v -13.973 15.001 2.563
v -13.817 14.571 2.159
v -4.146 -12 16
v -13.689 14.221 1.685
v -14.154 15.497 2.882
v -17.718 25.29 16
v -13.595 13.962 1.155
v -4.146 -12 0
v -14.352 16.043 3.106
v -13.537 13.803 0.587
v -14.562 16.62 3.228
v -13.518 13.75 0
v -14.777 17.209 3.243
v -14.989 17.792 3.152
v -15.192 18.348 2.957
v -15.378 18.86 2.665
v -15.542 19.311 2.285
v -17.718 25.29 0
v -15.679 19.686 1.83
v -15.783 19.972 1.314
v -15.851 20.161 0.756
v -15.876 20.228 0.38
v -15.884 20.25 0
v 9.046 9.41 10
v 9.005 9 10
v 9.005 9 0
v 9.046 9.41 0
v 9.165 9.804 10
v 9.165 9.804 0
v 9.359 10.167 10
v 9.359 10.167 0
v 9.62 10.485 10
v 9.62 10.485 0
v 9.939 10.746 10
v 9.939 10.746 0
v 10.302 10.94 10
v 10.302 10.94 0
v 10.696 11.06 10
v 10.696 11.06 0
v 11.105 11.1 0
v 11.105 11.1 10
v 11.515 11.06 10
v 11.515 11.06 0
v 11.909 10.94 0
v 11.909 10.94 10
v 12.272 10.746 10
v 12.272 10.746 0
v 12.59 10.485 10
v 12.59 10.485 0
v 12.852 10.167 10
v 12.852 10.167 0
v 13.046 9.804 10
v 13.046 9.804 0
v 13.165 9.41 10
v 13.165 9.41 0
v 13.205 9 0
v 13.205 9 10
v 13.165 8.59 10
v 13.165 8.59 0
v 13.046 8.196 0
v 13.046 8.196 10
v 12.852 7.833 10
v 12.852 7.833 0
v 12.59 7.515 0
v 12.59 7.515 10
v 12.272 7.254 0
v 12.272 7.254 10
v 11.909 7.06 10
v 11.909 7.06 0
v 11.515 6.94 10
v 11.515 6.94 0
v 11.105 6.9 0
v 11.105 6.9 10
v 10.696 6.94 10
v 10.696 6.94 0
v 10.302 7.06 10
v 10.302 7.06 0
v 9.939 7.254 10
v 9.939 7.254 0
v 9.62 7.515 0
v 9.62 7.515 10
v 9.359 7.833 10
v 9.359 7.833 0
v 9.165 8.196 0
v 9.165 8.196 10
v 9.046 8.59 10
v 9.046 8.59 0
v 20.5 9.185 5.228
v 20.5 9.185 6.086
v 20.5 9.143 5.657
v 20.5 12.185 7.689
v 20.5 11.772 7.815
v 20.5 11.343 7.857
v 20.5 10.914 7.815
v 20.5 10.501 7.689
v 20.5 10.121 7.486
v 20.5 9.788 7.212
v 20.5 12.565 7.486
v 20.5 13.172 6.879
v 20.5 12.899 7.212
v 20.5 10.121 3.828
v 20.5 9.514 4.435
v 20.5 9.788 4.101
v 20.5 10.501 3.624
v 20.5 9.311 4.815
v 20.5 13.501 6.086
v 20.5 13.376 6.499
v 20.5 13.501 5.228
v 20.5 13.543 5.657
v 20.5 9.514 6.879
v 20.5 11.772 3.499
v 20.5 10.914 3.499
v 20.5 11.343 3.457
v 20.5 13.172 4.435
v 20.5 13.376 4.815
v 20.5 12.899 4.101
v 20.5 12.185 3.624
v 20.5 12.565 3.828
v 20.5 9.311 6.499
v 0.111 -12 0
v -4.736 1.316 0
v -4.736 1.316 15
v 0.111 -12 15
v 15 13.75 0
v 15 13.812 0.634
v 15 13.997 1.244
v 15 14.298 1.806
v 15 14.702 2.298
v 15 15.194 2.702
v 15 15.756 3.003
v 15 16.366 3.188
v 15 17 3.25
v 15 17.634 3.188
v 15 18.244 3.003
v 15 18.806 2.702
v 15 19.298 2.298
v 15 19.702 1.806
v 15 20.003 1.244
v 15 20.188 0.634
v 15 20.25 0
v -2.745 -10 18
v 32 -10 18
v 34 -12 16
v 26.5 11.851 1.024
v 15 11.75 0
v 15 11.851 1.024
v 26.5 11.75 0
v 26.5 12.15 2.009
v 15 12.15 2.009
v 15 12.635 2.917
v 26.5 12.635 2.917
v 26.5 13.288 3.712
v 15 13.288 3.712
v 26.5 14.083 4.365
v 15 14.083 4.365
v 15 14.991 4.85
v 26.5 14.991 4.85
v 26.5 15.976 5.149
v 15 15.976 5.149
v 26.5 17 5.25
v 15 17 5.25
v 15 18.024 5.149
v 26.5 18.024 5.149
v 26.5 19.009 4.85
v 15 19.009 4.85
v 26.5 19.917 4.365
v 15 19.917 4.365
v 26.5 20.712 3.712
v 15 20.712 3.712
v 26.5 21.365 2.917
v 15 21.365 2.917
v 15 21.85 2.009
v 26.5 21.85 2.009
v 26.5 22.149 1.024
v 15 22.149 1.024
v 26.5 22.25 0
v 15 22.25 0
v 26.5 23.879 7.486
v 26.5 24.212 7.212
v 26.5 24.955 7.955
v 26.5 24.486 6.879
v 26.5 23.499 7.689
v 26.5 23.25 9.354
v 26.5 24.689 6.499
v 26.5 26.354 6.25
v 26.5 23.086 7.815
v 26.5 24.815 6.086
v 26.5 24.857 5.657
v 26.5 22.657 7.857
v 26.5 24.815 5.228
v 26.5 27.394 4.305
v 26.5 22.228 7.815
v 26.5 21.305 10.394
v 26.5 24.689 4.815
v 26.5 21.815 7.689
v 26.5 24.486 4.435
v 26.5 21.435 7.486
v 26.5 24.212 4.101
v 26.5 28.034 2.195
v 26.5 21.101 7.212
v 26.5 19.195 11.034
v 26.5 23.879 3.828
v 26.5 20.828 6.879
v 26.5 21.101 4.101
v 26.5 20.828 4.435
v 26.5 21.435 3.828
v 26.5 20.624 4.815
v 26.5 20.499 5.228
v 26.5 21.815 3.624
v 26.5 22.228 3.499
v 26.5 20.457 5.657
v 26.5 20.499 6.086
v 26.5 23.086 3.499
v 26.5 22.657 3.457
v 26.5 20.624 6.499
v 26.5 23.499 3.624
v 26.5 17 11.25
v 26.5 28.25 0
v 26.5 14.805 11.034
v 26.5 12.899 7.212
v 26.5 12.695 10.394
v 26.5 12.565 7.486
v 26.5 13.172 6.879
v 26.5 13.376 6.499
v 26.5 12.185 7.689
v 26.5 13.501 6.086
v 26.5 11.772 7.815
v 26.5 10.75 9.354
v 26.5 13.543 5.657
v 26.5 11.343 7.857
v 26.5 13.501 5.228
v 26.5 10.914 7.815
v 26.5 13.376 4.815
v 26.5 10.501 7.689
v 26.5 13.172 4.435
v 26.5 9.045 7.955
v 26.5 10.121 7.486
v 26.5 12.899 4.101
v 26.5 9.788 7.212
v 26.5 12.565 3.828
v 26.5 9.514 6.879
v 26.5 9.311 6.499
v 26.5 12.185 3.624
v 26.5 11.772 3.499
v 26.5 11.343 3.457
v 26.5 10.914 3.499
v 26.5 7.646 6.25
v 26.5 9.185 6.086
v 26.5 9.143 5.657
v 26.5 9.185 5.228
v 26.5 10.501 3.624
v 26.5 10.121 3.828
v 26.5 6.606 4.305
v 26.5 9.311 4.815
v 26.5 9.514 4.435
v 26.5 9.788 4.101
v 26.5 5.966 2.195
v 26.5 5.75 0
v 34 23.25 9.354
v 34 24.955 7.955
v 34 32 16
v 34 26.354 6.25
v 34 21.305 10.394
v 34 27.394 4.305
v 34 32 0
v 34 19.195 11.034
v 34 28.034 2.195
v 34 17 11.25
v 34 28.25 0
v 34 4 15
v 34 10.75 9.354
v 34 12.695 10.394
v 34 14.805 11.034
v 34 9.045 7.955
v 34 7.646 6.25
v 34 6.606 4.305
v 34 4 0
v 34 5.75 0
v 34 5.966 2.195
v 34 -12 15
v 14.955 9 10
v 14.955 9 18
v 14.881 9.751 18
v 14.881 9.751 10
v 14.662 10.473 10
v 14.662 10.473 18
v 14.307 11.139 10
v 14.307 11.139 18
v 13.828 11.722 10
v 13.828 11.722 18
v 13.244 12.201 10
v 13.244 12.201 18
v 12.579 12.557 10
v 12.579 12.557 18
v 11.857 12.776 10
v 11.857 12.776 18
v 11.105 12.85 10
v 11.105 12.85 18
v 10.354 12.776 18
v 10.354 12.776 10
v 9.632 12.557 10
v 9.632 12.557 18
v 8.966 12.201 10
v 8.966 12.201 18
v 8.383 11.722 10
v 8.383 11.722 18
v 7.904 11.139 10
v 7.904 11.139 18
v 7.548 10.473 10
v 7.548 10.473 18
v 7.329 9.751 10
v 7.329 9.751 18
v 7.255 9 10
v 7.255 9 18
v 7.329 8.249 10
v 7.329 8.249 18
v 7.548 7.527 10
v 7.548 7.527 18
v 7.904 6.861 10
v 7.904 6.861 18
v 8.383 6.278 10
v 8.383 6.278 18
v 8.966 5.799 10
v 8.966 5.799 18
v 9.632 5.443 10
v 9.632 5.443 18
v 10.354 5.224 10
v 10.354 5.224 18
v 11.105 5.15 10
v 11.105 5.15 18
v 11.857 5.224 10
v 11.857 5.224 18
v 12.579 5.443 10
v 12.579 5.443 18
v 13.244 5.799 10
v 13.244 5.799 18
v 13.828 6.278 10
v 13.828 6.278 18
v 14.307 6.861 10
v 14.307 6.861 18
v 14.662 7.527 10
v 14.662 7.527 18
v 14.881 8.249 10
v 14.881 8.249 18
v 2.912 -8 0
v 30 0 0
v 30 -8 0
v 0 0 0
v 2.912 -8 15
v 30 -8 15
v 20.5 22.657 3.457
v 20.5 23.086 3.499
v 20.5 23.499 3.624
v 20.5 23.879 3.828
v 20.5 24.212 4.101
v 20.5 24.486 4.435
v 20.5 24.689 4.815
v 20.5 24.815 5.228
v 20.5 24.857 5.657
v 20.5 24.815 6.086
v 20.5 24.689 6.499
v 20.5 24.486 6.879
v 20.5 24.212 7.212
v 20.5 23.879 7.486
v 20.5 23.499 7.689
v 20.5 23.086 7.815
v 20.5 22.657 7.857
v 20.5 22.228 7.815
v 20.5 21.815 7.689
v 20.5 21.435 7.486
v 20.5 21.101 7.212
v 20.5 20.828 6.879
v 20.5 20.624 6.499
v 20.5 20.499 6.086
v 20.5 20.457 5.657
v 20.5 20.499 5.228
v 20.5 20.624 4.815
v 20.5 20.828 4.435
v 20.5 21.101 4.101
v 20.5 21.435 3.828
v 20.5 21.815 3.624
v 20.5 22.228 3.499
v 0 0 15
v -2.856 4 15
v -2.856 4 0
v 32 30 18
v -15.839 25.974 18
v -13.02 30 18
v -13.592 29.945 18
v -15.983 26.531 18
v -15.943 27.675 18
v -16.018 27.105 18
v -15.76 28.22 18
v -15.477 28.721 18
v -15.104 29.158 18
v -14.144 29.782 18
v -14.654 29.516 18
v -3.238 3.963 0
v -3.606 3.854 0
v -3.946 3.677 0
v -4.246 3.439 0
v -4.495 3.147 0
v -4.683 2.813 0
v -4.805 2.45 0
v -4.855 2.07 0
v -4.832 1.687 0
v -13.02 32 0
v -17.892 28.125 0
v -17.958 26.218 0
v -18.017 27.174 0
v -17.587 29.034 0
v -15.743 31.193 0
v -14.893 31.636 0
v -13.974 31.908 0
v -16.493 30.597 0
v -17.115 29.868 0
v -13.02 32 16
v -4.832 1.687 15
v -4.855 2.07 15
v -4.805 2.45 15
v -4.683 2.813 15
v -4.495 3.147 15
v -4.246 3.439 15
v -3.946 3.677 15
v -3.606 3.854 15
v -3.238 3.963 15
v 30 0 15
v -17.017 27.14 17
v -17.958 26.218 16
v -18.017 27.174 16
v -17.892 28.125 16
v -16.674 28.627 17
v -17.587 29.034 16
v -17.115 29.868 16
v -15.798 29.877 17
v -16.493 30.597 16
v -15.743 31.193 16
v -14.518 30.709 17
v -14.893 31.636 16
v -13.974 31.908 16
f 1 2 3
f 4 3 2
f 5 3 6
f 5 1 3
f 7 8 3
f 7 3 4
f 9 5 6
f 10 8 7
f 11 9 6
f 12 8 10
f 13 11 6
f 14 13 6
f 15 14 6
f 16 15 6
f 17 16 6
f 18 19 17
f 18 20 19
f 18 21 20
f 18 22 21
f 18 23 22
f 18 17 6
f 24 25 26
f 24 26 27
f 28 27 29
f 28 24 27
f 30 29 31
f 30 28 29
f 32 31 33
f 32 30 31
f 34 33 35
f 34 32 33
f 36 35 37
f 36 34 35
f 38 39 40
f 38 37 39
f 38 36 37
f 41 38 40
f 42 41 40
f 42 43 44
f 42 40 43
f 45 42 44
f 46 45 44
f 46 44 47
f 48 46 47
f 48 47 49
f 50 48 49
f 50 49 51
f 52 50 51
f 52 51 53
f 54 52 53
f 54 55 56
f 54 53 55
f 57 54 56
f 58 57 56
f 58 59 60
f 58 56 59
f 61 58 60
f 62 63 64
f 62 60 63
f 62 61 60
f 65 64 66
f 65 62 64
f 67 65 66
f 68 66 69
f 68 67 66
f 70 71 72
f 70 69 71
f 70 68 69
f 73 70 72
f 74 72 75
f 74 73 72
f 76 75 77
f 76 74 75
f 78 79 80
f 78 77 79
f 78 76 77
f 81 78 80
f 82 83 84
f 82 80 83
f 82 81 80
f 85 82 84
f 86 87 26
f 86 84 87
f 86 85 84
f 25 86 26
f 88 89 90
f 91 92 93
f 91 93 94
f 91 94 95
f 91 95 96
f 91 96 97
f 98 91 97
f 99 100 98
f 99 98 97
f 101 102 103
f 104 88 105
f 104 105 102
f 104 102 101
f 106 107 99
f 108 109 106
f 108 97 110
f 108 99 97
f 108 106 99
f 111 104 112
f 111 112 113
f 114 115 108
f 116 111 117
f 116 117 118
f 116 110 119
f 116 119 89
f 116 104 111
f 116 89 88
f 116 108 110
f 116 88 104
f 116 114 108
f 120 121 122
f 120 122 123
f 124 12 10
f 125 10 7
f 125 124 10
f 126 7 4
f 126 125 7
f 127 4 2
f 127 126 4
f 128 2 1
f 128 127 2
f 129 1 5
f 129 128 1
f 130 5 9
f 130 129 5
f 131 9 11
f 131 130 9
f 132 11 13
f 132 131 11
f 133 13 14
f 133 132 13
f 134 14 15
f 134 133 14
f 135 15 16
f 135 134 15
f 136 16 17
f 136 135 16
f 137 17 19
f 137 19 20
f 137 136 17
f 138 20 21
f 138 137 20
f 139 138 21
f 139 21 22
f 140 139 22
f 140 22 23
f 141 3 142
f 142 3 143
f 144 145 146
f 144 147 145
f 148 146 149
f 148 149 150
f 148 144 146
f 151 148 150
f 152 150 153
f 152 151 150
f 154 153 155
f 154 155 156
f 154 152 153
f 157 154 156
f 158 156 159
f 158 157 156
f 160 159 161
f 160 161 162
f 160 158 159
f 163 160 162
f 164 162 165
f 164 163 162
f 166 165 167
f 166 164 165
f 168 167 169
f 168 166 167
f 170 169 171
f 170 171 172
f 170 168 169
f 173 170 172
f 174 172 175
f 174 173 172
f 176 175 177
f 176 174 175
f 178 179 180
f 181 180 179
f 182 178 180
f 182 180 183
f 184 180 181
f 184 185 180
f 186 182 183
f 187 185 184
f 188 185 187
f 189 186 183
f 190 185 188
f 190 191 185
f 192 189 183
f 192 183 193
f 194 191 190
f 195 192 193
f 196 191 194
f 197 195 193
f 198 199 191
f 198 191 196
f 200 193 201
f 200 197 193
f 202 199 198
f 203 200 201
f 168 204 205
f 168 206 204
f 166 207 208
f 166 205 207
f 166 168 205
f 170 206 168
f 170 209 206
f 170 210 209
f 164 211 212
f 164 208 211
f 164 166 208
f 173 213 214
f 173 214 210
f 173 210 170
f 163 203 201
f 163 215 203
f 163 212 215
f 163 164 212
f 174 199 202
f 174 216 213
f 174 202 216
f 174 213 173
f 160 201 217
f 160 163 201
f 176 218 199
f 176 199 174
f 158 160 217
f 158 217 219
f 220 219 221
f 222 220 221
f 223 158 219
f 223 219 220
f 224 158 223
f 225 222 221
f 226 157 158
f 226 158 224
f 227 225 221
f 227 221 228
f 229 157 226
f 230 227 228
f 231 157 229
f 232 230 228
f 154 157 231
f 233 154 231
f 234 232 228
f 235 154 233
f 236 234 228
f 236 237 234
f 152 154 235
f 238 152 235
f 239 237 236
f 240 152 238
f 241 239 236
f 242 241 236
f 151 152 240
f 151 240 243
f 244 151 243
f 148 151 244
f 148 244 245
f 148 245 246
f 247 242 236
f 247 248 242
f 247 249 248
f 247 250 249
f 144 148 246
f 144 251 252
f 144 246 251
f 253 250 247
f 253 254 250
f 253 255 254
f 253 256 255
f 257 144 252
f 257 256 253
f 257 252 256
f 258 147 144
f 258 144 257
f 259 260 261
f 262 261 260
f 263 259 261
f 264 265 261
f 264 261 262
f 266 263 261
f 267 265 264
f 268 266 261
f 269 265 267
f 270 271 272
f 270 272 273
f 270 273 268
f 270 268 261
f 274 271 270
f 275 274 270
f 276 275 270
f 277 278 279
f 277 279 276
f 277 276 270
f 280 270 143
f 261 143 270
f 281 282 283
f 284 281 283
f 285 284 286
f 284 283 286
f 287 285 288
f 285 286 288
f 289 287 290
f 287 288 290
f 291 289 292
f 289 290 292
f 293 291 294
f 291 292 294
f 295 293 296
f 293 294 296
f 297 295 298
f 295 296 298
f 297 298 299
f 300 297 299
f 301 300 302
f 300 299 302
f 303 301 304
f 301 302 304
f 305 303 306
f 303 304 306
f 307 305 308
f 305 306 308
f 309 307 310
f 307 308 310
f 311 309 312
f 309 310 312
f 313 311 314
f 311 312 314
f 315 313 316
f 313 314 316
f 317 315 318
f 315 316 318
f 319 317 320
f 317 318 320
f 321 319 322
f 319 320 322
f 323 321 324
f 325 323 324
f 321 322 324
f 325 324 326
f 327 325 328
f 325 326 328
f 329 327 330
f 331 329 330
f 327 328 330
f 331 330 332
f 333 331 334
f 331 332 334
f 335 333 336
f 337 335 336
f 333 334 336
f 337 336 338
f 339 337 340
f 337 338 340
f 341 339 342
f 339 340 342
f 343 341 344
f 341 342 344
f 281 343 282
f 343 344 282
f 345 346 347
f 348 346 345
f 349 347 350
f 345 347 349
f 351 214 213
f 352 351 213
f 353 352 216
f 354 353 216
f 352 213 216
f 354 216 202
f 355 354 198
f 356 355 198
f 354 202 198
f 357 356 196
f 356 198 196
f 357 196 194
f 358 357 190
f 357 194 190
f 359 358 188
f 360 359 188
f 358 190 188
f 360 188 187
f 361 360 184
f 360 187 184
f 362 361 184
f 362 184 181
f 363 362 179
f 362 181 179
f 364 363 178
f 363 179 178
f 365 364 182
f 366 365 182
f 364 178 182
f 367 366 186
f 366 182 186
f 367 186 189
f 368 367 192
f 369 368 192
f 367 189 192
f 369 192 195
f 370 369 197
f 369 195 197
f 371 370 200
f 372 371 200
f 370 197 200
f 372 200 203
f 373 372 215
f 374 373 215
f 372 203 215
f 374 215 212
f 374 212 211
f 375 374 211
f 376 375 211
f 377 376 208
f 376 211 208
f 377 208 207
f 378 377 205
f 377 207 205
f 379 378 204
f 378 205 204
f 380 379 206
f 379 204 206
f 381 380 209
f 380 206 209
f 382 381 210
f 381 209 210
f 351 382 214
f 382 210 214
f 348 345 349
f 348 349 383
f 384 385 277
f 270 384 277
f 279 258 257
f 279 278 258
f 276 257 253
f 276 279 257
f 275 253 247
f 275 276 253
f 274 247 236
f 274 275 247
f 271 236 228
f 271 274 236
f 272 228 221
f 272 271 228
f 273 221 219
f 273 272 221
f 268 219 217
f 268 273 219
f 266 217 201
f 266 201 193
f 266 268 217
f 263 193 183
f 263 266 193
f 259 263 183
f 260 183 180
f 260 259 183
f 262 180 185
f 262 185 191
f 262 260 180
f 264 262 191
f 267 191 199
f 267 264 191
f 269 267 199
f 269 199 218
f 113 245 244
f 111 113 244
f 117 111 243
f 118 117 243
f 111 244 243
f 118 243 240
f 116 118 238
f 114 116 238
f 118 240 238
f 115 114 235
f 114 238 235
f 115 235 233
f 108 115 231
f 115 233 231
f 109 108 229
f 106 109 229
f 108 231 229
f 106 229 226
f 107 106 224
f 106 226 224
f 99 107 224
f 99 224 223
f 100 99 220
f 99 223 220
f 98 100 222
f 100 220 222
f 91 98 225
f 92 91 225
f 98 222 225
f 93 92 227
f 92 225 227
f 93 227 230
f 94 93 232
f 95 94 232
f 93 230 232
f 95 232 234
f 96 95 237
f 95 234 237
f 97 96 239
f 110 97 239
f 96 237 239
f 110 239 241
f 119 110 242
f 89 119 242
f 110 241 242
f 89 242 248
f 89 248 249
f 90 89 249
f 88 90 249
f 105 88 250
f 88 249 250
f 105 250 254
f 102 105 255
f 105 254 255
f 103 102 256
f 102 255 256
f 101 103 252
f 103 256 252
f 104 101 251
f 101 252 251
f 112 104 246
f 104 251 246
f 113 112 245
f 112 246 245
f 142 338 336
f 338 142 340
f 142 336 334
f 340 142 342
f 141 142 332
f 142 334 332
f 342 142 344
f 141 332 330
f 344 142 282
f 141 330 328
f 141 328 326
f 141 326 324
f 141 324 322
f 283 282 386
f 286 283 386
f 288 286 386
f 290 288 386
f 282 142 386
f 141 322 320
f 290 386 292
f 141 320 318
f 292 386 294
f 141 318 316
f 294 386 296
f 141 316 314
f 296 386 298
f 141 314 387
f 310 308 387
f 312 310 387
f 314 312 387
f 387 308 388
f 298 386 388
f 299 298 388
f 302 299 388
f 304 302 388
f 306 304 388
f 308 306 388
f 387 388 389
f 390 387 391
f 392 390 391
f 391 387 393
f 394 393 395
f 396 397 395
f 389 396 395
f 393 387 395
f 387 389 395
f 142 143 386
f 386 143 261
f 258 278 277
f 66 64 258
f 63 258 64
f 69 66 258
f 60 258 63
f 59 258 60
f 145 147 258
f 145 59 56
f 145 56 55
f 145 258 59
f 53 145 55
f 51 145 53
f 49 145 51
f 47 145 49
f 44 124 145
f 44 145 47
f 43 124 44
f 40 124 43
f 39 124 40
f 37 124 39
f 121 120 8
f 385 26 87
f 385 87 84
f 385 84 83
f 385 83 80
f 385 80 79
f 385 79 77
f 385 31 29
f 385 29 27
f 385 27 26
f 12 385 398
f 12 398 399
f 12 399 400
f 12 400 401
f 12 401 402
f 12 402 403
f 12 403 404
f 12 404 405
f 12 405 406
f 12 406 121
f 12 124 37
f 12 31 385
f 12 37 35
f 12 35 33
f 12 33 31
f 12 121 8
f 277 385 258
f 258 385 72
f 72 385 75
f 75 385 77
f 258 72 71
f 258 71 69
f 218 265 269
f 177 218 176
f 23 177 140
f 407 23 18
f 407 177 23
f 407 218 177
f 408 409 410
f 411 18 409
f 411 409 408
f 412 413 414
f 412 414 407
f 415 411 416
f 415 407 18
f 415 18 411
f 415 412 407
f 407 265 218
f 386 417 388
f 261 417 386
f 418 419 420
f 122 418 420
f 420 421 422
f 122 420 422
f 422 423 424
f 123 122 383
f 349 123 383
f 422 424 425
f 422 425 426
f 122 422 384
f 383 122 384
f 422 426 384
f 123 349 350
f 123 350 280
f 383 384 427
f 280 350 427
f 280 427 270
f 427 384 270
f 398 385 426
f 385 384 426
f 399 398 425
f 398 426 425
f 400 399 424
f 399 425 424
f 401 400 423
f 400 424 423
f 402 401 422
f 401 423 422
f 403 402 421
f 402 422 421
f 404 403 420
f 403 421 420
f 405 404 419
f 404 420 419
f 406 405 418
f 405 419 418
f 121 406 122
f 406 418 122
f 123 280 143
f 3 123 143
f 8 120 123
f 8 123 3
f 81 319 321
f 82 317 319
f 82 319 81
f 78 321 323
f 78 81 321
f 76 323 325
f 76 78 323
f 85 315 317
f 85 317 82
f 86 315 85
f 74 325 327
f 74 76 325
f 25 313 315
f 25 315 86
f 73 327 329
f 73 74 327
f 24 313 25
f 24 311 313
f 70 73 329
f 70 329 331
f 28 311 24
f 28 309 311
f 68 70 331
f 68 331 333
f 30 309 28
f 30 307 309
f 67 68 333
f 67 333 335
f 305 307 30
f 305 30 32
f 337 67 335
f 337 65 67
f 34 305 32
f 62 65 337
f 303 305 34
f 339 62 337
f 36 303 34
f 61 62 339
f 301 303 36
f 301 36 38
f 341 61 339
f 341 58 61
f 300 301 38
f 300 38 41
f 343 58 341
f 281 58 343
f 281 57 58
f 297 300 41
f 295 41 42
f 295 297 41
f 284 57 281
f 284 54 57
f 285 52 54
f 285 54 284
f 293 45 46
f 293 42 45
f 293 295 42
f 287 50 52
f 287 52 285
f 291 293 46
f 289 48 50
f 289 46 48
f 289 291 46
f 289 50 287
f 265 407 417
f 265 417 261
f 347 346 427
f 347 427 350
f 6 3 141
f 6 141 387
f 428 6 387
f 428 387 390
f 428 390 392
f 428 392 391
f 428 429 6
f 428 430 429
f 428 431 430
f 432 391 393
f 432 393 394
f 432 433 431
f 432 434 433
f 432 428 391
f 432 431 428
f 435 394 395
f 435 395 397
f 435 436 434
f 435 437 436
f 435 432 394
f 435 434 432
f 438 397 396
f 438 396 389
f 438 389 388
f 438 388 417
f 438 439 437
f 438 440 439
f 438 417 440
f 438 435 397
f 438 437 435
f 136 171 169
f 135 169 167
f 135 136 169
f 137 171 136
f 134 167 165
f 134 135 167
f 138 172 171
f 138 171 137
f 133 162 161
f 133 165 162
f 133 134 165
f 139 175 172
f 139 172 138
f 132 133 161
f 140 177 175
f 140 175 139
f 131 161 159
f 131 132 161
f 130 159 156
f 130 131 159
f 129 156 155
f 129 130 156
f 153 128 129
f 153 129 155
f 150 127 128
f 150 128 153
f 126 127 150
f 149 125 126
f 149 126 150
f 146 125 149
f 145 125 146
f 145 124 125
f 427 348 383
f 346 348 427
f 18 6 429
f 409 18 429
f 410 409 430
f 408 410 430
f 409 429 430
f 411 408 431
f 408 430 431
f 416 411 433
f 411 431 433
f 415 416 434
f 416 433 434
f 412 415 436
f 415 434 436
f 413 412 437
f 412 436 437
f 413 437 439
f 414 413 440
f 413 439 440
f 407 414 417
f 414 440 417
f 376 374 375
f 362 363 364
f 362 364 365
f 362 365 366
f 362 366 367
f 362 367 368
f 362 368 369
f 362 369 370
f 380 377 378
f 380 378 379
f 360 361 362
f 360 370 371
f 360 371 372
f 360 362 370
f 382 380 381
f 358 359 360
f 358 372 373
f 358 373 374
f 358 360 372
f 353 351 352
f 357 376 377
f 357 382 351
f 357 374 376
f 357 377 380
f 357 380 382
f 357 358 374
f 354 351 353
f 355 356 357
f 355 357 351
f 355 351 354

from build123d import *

# Parameters (mm, degrees)
BOSS_EXTRUDE1_DEPTH     = 15
BOSS_EXTRUDE2_DEPTH     = 3
BOSS_EXTRUDE3_DEPTH     = 15
CUT_EXTRUDE1_DEPTH      = 45.988887517
FILLET2_R               = 2
BOSS_EXTRUDE4_DEPTH     = 18
SKETCH8_R               = 2.2
CUT_EXTRUDE3_DEPTH      = 6
FILLET3_R               = 5
FILLET4_SIZE            = 2
CUT_EXTRUDE4_DEPTH      = 51.039984013
CUT_EXTRUDE4_DEPTH_BACK = 51.039984013
SKETCH9_R               = 2.1
SKETCH10_R              = 3.85
CUT_EXTRUDE5_DEPTH      = 8


with BuildPart() as part:
    # Sketch1 → Boss-Extrude1 (new body)
    with BuildSketch(Plane.XY):
        Polygon((0, 0), (30, 0), (30, -8), (2.911761874, -8), align=None)
    extrude(amount=BOSS_EXTRUDE1_DEPTH)

    # Sketch2 → Boss-Extrude2 (add)
    with BuildSketch(Plane.XY.offset(15)):
        Polygon((-11.425184054, 8), (-2.689898432, -16), (38, -16), (38, 8), align=None)
    extrude(amount=BOSS_EXTRUDE2_DEPTH)

    # Sketch3 → Boss-Extrude3 (add)
    with BuildSketch(Plane(origin=(0, 0, 0), x_dir=(-1, 0, 0), z_dir=(0, 0, -1))):
        Polygon((5.712592027, 4), (-34, 4), (-34, -12), (-34, -16), (-38, -16), (-38, 8), (11.425184054, 8), (2.689898432, -16), (-1.566812658, -16), (-0.110931721, -12), align=None)
    extrude(amount=-BOSS_EXTRUDE3_DEPTH)

    # Sketch4 → Cut-Extrude1 (cut, through all)
    with BuildSketch(Plane(origin=(0, 0, 0), x_dir=(-1, 0, 0), z_dir=(0, 0, -1))):
        Polygon((-38, 8), (-34, 8), (-34, -12), (4.145779369, -12), (4.145779369, -16), (-30, -16), (-38, -16), align=None)
    extrude(amount=-CUT_EXTRUDE1_DEPTH, mode=Mode.SUBTRACT)

    # Fillet2
    fillet2_edges = [part.edges().sort_by_distance(p)[0] for p in [
        (-5.712592027, 4, 7.5),
    ]]
    fillet(fillet2_edges, radius=FILLET2_R)

    # Sketch5 → Boss-Extrude4 (add)
    with BuildSketch(Plane(origin=(0, 0, 0), x_dir=(-1, 0, 0), z_dir=(0, 0, -1))):
        Polygon((11.425184054, 8), (20.160469676, 32), (-34, 32), (-34, 8), align=None)
    extrude(amount=-BOSS_EXTRUDE4_DEPTH)

    # Sketch7 → Cut-Revolve1 (revolve, cut)
    with BuildSketch(Plane(origin=(0, 0, 0), x_dir=(-1, 0, 0), z_dir=(0, 0, -1))):
        Polygon((-34, 17), (14.700916162, 17), (15.883819424, 20.25), (-15, 20.25), (-15, 22.25), (-26.5, 22.25), (-26.5, 28.25), (-34, 28.25), align=None)
    revolve(axis=Axis((34, 17, 0), (-1, 0, 0)), mode=Mode.SUBTRACT)

    # Sketch8 → Cut-Extrude3 (cut)
    with BuildSketch(Plane(origin=(26.5, 0, 0), x_dir=(0, 0, -1), z_dir=(1, 0, 0))):
        with Locations((-5.656854249, 22.656854249)):
            Circle(SKETCH8_R)
        with Locations((5.656854249, 22.656854249)):
            Circle(SKETCH8_R)
        with Locations((5.656854249, 11.343145751)):
            Circle(SKETCH8_R)
        with Locations((-5.656854249, 11.343145751)):
            Circle(SKETCH8_R)
    extrude(amount=-CUT_EXTRUDE3_DEPTH, mode=Mode.SUBTRACT)

    # Fillet3
    fillet3_edges = [part.edges().sort_by_distance(p)[0] for p in [
        (-20.160469676, 32, 9),
    ]]
    fillet(fillet3_edges, radius=FILLET3_R)

    # Fillet4
    fillet4_edges = [part.edges().sort_by_distance(p)[0] for p in [
        (10.490135179, 32, 18),
        (-10.931986058, 6.644949642, 18),
        (-17.115489864, 29.867882182, 18),
        (34, 10, 18),
        (14.927110316, -12, 18),
    ]]
    chamfer(fillet4_edges, length=FILLET4_SIZE)

    # Sketch9 → Cut-Extrude4 (cut, two sides: drawn at the far end of the back side and taken through both)
    with BuildSketch(Plane(origin=(0, 0, 0), x_dir=(-1, 0, 0), z_dir=(0, 0, -1)).offset(-CUT_EXTRUDE4_DEPTH_BACK)):
        with Locations((-11.105422856, 9)):
            Circle(SKETCH9_R)
    extrude(amount=CUT_EXTRUDE4_DEPTH + CUT_EXTRUDE4_DEPTH_BACK, mode=Mode.SUBTRACT)

    # Sketch10 → Cut-Extrude5 (cut)
    with BuildSketch(Plane.XY.offset(18)):
        with Locations((11.105422856, 9)):
            Circle(SKETCH10_R)
    extrude(amount=-CUT_EXTRUDE5_DEPTH, mode=Mode.SUBTRACT)


solid = part.part
